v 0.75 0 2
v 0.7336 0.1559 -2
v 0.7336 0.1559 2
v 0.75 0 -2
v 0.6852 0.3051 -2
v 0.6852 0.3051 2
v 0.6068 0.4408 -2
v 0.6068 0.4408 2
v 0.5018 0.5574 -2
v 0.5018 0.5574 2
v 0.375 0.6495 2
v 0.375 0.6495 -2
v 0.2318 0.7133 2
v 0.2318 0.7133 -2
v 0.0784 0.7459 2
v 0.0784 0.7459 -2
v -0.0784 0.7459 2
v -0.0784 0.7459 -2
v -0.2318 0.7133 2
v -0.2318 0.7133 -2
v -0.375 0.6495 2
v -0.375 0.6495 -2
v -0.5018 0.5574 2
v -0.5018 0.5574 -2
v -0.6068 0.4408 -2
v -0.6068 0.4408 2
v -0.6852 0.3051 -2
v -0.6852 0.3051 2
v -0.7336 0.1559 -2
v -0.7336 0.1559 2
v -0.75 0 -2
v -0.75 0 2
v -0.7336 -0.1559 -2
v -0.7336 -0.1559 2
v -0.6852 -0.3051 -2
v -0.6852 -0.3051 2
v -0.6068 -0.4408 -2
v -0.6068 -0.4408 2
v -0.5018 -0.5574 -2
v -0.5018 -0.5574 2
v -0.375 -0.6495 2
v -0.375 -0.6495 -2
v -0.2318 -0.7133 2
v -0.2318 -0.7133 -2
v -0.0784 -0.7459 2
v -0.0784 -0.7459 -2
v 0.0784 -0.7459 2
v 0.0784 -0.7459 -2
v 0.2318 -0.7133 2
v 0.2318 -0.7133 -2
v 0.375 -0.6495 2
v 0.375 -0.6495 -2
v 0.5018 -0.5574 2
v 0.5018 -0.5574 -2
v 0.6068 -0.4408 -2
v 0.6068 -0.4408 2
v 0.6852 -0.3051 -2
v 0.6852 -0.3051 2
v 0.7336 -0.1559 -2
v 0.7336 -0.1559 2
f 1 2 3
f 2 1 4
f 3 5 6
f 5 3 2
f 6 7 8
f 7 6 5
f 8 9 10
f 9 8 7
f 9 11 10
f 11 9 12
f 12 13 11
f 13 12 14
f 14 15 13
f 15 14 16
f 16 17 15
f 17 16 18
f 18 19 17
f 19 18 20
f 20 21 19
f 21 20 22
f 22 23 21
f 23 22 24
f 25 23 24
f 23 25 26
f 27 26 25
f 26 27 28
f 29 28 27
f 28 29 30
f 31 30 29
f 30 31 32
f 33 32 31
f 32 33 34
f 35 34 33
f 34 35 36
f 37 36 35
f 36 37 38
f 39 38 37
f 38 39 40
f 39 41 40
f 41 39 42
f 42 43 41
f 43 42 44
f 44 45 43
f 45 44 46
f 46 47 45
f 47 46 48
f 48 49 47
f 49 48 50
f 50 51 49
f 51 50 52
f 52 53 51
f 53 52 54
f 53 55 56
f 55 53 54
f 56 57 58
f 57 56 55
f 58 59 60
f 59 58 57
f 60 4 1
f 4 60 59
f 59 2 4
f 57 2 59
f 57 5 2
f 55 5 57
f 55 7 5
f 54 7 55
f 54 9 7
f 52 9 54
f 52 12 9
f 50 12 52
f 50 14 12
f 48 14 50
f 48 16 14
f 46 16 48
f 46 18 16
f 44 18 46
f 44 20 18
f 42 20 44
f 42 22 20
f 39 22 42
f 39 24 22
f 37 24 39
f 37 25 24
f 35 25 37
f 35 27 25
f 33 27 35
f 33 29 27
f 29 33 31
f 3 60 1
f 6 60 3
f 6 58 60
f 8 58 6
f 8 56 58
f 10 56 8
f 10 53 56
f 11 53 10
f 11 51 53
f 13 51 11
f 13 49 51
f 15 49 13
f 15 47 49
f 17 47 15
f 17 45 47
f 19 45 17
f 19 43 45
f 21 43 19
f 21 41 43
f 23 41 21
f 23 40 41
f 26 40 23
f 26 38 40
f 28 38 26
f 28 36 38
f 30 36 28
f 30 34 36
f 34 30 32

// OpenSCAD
// part_id: c3
// name: C3 pin
// source_drawing_ids: DRW-004
// units: mm
// SPDX-License-Identifier: MIT
//
// Part C3: simple cylindrical pin used twice in the c gear train.
//
// Local origin convention:
// - XY origin is the pin axis.
// - Z origin is the part midplane.

module part_c3(pin_d = 1.5, pin_h = 4.0) {
    cylinder(d = pin_d, h = pin_h, center = true, $fn = 30);
}

// ---- "main guard" ----
if (is_undef(__LIB_MODE__)) {
    part_c3();
}
